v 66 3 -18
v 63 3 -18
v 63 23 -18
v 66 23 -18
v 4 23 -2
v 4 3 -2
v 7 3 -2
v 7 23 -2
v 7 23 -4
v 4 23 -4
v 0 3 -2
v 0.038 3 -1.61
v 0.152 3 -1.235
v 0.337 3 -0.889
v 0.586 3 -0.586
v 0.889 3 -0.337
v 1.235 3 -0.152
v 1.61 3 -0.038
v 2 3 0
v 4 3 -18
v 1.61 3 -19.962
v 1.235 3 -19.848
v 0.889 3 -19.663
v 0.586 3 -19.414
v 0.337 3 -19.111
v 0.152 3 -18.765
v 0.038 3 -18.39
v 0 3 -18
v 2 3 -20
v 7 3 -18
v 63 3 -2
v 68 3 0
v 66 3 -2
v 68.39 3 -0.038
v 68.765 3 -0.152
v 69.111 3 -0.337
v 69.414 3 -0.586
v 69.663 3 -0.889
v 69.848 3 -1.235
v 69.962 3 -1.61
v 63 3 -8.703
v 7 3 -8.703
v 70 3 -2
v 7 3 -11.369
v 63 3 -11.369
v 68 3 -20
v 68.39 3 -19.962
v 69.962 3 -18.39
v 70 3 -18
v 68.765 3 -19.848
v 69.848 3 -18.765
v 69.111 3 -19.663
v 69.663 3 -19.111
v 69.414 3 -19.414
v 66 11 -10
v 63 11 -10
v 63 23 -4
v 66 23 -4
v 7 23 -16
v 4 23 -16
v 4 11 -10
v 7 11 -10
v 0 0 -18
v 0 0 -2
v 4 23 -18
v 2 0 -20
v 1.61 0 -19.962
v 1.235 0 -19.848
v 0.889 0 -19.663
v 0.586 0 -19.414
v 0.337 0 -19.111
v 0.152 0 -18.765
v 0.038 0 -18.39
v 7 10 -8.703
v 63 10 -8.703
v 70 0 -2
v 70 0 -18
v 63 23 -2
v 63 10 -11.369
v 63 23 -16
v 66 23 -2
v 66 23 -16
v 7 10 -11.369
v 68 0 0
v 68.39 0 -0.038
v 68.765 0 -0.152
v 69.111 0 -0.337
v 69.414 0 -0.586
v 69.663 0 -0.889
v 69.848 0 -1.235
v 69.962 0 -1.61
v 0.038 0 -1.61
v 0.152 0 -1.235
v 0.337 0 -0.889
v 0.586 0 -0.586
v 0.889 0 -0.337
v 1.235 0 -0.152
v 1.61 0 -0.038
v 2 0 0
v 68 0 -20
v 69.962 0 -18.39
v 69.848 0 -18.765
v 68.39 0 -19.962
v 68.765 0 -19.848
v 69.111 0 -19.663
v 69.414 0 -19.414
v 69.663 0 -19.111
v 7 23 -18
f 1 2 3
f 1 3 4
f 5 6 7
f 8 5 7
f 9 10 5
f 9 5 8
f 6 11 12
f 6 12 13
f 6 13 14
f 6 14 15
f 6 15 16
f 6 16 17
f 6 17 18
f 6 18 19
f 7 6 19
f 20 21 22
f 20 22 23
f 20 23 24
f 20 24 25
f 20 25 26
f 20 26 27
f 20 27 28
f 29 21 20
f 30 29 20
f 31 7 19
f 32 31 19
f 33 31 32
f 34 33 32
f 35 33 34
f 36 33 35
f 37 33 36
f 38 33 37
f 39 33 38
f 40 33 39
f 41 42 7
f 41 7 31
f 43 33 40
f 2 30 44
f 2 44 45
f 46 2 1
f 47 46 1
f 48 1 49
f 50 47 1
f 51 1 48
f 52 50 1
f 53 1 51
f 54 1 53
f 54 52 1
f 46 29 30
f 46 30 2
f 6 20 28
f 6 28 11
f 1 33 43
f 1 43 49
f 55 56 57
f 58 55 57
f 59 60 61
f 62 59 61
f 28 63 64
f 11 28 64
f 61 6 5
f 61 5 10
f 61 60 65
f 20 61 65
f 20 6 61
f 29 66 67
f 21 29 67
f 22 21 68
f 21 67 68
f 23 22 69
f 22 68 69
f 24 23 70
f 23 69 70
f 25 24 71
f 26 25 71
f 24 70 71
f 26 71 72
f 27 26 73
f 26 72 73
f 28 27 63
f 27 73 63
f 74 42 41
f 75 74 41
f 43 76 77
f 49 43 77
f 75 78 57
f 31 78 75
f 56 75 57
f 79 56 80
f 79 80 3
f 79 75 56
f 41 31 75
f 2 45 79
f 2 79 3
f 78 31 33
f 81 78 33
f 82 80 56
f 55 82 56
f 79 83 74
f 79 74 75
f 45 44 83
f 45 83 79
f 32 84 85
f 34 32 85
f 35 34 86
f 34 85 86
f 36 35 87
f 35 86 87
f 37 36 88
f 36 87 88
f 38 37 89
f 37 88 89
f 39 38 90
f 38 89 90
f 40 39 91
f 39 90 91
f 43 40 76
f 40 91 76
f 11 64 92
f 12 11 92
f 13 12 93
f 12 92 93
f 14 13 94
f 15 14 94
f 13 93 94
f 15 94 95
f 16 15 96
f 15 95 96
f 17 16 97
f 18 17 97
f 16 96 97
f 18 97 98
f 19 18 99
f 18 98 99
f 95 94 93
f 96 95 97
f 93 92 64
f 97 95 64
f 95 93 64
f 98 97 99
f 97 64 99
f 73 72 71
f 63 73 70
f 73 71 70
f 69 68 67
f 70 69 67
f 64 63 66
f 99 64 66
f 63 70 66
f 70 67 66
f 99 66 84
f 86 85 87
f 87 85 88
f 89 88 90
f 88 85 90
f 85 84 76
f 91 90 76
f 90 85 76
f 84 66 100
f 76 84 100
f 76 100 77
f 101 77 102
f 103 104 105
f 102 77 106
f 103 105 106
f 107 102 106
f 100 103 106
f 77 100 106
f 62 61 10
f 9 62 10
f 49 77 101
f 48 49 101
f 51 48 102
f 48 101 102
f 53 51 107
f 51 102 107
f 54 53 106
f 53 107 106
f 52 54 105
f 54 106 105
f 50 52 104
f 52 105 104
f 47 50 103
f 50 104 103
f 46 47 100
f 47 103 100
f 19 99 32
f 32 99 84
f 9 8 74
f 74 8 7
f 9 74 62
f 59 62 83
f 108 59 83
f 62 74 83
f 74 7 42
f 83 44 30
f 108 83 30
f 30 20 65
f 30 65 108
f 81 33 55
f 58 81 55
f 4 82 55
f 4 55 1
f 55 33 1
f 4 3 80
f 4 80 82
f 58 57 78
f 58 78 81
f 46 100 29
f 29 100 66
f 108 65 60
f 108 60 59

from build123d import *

# Parameters (mm, degrees)
EXTRUDE_451_DEPTH           = 3
SKETCH_505_W                = 3
SKETCH_505_H                = 16
EXTRUDE_763_DEPTH           = 20
CUT_EXTRUDE_1013_DEPTH      = 5
CUT_EXTRUDE_1013_DEPTH_BACK = 3
SKETCH_8_W                  = 3
SKETCH_8_H                  = 16
EXTRUDE_1404_DEPTH          = 20
CUT_EXTRUDE_1670_DEPTH      = 64
CUT_EXTRUDE_1670_DEPTH_BACK = 3
SKETCH_11_W                 = 56
SKETCH_11_H                 = 2.665153407
EXTRUDE_1980_DEPTH          = 7


with BuildPart() as part:
    # Sketch 219 → Extrude 451 (new body)
    with BuildSketch(Plane(origin=(0, 0, 0), x_dir=(1, 0, 0), z_dir=(0, 1, 0))):
        with BuildLine():
            Line((2, 0), (68, 0))
            ThreePointArc((68, 0), (69.414213562, 0.585786438), (70, 2))
            Line((70, 2), (70, 18))
            ThreePointArc((70, 18), (69.414213562, 19.414213562), (68, 20))
            Line((68, 20), (2, 20))
            ThreePointArc((2, 20), (0.585786438, 19.414213562), (0, 18))
            Line((0, 18), (0, 2))
            ThreePointArc((0, 2), (0.585786438, 0.585786438), (2, 0))
        make_face()
    extrude(amount=EXTRUDE_451_DEPTH)

    # Sketch 505 → Extrude 763 (add)
    with BuildSketch(Plane(origin=(0, 3, 0), x_dir=(1, 0, 0), z_dir=(0, 1, 0))):
        with Locations((5.5, 10)):
            Rectangle(SKETCH_505_W, SKETCH_505_H)
    extrude(amount=EXTRUDE_763_DEPTH)

    # Sketch 818 → Cut-Extrude 1013 (cut, two sides)
    with BuildSketch(Plane.ZY.offset(-4)) as cut_extrude_1013_sk:
        Polygon((-45.532064127, 82.064128255), (-16, 23), (-10, 11), (-4, 23), (25.532064127, 82.064128255), (25.532064127, 214.135534064), (-45.532064127, 214.135534064), align=None)
    extrude(amount=CUT_EXTRUDE_1013_DEPTH, mode=Mode.SUBTRACT)
    extrude(cut_extrude_1013_sk.sketch, amount=-CUT_EXTRUDE_1013_DEPTH_BACK, mode=Mode.SUBTRACT)

    # Эскиз8 → Extrude 1404 (add)
    with BuildSketch(Plane(origin=(31.408501121, 3, 2.625790974), x_dir=(1, 0, 0), z_dir=(0, 1, 0))):
        with Locations((33.091498879, 12.625790974)):
            Rectangle(SKETCH_8_W, SKETCH_8_H)
    extrude(amount=EXTRUDE_1404_DEPTH)

    # Эскиз10 → Cut-Extrude 1670 (cut, two sides)
    with BuildSketch(Plane(origin=(63, 0, 2.625790974), x_dir=(0, 0, 1), z_dir=(-1, 0, 0))) as cut_extrude_1670_sk:
        Polygon((-48.157855101, 82.064128255), (-18.625790974, 23), (-12.625790974, 11), (-6.625790974, 23), (22.906273154, 82.064128255), (22.906273154, 214.135534064), (-48.157855101, 214.135534064), align=None)
    extrude(amount=CUT_EXTRUDE_1670_DEPTH, mode=Mode.SUBTRACT)
    extrude(cut_extrude_1670_sk.sketch, amount=-CUT_EXTRUDE_1670_DEPTH_BACK, mode=Mode.SUBTRACT)

    # Эскиз11 → Extrude 1980 (add)
    with BuildSketch(Plane(origin=(0, 3, 0), x_dir=(1, 0, 0), z_dir=(0, 1, 0))):
        with Locations((35, 10.036015586)):
            Rectangle(SKETCH_11_W, SKETCH_11_H)
    extrude(amount=EXTRUDE_1980_DEPTH)


solid = part.part
